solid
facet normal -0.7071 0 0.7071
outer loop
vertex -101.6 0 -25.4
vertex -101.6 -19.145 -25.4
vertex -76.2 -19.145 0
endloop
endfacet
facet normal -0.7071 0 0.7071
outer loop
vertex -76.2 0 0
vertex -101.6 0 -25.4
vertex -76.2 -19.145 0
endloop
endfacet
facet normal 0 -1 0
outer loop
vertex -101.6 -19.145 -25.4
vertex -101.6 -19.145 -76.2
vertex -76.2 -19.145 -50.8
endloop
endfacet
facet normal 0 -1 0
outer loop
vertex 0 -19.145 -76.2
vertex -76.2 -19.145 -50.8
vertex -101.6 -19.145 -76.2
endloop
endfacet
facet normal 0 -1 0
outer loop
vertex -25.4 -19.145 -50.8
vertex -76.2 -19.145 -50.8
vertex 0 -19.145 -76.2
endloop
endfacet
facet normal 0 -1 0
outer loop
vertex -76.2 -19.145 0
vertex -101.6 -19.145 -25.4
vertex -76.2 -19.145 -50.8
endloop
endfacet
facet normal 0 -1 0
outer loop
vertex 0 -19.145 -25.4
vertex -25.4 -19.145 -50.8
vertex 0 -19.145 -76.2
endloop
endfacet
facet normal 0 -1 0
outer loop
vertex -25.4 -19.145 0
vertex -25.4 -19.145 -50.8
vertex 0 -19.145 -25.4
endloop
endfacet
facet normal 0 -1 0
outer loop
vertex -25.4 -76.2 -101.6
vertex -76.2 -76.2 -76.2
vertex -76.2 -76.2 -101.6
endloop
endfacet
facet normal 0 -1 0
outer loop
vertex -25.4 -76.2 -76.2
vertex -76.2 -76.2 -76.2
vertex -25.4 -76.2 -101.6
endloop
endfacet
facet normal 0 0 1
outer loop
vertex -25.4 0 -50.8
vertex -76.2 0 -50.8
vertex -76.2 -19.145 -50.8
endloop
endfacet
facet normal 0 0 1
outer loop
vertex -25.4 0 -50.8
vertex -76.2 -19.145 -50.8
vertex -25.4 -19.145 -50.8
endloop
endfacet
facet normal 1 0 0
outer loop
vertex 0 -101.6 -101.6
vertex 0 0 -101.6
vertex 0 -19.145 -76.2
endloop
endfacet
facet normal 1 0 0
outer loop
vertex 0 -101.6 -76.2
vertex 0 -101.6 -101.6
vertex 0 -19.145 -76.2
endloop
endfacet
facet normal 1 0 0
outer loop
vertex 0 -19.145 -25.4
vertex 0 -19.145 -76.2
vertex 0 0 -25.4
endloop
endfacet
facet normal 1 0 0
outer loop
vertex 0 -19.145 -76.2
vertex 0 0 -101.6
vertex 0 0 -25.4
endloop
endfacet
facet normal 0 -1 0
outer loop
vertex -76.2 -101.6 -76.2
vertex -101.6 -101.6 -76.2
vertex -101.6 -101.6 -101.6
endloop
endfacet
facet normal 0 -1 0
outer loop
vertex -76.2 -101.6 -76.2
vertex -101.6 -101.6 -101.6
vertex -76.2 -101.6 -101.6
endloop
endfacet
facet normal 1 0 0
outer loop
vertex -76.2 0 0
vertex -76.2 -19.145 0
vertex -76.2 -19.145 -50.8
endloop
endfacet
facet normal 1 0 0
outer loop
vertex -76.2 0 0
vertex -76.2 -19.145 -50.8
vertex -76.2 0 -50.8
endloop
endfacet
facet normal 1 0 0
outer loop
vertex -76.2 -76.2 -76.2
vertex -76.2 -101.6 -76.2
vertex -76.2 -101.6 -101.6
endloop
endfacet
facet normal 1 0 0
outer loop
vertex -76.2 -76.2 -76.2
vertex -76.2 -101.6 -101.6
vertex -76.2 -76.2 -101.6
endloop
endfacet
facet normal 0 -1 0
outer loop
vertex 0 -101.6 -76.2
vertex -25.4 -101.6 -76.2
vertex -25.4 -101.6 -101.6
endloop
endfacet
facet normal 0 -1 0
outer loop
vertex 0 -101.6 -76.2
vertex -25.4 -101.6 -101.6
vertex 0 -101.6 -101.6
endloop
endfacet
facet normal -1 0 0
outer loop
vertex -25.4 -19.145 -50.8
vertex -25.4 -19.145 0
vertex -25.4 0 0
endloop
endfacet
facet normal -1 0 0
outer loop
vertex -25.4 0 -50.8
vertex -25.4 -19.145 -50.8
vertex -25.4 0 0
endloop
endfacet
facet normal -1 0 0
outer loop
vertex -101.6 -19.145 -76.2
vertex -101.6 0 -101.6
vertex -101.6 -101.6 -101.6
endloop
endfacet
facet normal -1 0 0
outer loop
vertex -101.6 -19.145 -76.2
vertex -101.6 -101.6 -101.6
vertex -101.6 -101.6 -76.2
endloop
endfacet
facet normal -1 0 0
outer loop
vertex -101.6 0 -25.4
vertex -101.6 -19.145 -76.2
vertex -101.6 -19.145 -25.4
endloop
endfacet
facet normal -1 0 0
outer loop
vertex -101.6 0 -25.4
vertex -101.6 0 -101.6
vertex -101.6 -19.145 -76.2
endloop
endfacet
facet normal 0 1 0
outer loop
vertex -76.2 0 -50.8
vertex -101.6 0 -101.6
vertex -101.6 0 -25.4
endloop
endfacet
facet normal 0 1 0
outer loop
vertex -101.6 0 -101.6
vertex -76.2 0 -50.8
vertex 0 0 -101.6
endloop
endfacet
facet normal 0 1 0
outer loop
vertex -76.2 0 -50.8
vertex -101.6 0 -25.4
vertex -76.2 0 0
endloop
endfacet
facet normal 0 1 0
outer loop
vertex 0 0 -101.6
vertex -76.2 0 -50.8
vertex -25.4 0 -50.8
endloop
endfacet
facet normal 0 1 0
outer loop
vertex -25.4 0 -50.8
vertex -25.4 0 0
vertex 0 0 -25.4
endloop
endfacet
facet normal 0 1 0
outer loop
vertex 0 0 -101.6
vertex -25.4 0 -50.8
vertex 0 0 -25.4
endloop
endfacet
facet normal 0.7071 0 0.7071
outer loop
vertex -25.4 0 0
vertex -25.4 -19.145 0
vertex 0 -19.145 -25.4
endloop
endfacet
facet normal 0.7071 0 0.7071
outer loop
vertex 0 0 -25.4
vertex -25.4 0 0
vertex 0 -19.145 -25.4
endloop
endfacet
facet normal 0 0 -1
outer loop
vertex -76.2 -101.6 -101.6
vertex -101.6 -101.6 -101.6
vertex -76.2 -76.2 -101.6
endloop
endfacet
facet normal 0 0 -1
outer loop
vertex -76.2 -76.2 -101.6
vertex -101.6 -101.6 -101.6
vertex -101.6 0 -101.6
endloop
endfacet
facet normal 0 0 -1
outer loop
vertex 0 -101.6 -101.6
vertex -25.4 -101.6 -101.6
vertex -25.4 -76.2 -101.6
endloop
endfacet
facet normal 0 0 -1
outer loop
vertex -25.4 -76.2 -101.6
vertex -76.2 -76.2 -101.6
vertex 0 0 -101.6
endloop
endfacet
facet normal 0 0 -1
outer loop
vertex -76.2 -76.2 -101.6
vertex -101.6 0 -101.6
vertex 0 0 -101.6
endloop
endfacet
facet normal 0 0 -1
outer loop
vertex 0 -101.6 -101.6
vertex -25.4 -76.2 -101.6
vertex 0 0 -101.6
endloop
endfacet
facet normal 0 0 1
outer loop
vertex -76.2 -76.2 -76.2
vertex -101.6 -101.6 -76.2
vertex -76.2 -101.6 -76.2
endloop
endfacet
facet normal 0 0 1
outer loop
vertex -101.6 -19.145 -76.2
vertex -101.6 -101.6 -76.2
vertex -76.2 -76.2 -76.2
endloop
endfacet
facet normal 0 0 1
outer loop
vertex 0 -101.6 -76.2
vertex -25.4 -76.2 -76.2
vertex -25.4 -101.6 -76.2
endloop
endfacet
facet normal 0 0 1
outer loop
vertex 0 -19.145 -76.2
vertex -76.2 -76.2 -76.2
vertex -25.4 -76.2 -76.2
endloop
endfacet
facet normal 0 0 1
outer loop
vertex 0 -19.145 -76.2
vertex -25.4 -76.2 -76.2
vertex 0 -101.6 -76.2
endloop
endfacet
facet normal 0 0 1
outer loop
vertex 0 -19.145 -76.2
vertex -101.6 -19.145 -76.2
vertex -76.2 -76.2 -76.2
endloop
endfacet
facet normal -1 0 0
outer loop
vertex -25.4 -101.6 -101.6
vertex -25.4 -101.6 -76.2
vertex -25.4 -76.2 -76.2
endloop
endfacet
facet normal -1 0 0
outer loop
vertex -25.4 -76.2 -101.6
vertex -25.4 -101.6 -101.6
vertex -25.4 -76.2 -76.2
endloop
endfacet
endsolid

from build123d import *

# Parameters (mm, degrees)
F0_W     = 101.6
F0_H     = 101.6
F1_DEPTH = 101.6
F2_W     = 101.6
F2_H     = 82.4549061418
F3_DEPTH = 76.2
F4_W     = 50.8
F4_H     = 25.4
F5_DEPTH = 50.546
F6_W     = 50.8
F6_H     = 19.1450938582
F7_DEPTH = 50.8
F9_DEPTH = 136.906


with BuildPart() as f1:
    # F0 (on Front) → F1 (new body)
    with BuildSketch(Plane.XZ):
        with Locations((-50.8, -50.8)):
            Rectangle(F0_W, F0_H)
    extrude(amount=F1_DEPTH)

    # F2 (on face) → F3 (cut)
    with BuildSketch(Plane.XY):
        with Locations((-50.8, -60.3725469291)):
            Rectangle(F2_W, F2_H)
    extrude(amount=-F3_DEPTH, mode=Mode.SUBTRACT)

    # F4 (on face) → F5 (cut)
    with BuildSketch(Plane.XY.offset(-76.2)):
        with Locations((-50.8, -88.9)):
            Rectangle(F4_W, F4_H)
    extrude(amount=-F5_DEPTH, mode=Mode.SUBTRACT)

    # F6 (on face) → F7 (cut)
    with BuildSketch(Plane.XY):
        with Locations((-50.8, -9.5725469291)):
            Rectangle(F6_W, F6_H)
    extrude(amount=-F7_DEPTH, mode=Mode.SUBTRACT)

    # F8 (on face) → F9 (cut)
    with BuildSketch(Plane.XZ.offset(19.1450938582)):
        Polygon((-101.6, 0), (-101.6, -25.4), (-76.2, 0), align=None)
        Polygon((-25.4, 0), (0, -25.4), (0, 0), align=None)
    extrude(amount=-F9_DEPTH, mode=Mode.SUBTRACT)


solid = f1.part
